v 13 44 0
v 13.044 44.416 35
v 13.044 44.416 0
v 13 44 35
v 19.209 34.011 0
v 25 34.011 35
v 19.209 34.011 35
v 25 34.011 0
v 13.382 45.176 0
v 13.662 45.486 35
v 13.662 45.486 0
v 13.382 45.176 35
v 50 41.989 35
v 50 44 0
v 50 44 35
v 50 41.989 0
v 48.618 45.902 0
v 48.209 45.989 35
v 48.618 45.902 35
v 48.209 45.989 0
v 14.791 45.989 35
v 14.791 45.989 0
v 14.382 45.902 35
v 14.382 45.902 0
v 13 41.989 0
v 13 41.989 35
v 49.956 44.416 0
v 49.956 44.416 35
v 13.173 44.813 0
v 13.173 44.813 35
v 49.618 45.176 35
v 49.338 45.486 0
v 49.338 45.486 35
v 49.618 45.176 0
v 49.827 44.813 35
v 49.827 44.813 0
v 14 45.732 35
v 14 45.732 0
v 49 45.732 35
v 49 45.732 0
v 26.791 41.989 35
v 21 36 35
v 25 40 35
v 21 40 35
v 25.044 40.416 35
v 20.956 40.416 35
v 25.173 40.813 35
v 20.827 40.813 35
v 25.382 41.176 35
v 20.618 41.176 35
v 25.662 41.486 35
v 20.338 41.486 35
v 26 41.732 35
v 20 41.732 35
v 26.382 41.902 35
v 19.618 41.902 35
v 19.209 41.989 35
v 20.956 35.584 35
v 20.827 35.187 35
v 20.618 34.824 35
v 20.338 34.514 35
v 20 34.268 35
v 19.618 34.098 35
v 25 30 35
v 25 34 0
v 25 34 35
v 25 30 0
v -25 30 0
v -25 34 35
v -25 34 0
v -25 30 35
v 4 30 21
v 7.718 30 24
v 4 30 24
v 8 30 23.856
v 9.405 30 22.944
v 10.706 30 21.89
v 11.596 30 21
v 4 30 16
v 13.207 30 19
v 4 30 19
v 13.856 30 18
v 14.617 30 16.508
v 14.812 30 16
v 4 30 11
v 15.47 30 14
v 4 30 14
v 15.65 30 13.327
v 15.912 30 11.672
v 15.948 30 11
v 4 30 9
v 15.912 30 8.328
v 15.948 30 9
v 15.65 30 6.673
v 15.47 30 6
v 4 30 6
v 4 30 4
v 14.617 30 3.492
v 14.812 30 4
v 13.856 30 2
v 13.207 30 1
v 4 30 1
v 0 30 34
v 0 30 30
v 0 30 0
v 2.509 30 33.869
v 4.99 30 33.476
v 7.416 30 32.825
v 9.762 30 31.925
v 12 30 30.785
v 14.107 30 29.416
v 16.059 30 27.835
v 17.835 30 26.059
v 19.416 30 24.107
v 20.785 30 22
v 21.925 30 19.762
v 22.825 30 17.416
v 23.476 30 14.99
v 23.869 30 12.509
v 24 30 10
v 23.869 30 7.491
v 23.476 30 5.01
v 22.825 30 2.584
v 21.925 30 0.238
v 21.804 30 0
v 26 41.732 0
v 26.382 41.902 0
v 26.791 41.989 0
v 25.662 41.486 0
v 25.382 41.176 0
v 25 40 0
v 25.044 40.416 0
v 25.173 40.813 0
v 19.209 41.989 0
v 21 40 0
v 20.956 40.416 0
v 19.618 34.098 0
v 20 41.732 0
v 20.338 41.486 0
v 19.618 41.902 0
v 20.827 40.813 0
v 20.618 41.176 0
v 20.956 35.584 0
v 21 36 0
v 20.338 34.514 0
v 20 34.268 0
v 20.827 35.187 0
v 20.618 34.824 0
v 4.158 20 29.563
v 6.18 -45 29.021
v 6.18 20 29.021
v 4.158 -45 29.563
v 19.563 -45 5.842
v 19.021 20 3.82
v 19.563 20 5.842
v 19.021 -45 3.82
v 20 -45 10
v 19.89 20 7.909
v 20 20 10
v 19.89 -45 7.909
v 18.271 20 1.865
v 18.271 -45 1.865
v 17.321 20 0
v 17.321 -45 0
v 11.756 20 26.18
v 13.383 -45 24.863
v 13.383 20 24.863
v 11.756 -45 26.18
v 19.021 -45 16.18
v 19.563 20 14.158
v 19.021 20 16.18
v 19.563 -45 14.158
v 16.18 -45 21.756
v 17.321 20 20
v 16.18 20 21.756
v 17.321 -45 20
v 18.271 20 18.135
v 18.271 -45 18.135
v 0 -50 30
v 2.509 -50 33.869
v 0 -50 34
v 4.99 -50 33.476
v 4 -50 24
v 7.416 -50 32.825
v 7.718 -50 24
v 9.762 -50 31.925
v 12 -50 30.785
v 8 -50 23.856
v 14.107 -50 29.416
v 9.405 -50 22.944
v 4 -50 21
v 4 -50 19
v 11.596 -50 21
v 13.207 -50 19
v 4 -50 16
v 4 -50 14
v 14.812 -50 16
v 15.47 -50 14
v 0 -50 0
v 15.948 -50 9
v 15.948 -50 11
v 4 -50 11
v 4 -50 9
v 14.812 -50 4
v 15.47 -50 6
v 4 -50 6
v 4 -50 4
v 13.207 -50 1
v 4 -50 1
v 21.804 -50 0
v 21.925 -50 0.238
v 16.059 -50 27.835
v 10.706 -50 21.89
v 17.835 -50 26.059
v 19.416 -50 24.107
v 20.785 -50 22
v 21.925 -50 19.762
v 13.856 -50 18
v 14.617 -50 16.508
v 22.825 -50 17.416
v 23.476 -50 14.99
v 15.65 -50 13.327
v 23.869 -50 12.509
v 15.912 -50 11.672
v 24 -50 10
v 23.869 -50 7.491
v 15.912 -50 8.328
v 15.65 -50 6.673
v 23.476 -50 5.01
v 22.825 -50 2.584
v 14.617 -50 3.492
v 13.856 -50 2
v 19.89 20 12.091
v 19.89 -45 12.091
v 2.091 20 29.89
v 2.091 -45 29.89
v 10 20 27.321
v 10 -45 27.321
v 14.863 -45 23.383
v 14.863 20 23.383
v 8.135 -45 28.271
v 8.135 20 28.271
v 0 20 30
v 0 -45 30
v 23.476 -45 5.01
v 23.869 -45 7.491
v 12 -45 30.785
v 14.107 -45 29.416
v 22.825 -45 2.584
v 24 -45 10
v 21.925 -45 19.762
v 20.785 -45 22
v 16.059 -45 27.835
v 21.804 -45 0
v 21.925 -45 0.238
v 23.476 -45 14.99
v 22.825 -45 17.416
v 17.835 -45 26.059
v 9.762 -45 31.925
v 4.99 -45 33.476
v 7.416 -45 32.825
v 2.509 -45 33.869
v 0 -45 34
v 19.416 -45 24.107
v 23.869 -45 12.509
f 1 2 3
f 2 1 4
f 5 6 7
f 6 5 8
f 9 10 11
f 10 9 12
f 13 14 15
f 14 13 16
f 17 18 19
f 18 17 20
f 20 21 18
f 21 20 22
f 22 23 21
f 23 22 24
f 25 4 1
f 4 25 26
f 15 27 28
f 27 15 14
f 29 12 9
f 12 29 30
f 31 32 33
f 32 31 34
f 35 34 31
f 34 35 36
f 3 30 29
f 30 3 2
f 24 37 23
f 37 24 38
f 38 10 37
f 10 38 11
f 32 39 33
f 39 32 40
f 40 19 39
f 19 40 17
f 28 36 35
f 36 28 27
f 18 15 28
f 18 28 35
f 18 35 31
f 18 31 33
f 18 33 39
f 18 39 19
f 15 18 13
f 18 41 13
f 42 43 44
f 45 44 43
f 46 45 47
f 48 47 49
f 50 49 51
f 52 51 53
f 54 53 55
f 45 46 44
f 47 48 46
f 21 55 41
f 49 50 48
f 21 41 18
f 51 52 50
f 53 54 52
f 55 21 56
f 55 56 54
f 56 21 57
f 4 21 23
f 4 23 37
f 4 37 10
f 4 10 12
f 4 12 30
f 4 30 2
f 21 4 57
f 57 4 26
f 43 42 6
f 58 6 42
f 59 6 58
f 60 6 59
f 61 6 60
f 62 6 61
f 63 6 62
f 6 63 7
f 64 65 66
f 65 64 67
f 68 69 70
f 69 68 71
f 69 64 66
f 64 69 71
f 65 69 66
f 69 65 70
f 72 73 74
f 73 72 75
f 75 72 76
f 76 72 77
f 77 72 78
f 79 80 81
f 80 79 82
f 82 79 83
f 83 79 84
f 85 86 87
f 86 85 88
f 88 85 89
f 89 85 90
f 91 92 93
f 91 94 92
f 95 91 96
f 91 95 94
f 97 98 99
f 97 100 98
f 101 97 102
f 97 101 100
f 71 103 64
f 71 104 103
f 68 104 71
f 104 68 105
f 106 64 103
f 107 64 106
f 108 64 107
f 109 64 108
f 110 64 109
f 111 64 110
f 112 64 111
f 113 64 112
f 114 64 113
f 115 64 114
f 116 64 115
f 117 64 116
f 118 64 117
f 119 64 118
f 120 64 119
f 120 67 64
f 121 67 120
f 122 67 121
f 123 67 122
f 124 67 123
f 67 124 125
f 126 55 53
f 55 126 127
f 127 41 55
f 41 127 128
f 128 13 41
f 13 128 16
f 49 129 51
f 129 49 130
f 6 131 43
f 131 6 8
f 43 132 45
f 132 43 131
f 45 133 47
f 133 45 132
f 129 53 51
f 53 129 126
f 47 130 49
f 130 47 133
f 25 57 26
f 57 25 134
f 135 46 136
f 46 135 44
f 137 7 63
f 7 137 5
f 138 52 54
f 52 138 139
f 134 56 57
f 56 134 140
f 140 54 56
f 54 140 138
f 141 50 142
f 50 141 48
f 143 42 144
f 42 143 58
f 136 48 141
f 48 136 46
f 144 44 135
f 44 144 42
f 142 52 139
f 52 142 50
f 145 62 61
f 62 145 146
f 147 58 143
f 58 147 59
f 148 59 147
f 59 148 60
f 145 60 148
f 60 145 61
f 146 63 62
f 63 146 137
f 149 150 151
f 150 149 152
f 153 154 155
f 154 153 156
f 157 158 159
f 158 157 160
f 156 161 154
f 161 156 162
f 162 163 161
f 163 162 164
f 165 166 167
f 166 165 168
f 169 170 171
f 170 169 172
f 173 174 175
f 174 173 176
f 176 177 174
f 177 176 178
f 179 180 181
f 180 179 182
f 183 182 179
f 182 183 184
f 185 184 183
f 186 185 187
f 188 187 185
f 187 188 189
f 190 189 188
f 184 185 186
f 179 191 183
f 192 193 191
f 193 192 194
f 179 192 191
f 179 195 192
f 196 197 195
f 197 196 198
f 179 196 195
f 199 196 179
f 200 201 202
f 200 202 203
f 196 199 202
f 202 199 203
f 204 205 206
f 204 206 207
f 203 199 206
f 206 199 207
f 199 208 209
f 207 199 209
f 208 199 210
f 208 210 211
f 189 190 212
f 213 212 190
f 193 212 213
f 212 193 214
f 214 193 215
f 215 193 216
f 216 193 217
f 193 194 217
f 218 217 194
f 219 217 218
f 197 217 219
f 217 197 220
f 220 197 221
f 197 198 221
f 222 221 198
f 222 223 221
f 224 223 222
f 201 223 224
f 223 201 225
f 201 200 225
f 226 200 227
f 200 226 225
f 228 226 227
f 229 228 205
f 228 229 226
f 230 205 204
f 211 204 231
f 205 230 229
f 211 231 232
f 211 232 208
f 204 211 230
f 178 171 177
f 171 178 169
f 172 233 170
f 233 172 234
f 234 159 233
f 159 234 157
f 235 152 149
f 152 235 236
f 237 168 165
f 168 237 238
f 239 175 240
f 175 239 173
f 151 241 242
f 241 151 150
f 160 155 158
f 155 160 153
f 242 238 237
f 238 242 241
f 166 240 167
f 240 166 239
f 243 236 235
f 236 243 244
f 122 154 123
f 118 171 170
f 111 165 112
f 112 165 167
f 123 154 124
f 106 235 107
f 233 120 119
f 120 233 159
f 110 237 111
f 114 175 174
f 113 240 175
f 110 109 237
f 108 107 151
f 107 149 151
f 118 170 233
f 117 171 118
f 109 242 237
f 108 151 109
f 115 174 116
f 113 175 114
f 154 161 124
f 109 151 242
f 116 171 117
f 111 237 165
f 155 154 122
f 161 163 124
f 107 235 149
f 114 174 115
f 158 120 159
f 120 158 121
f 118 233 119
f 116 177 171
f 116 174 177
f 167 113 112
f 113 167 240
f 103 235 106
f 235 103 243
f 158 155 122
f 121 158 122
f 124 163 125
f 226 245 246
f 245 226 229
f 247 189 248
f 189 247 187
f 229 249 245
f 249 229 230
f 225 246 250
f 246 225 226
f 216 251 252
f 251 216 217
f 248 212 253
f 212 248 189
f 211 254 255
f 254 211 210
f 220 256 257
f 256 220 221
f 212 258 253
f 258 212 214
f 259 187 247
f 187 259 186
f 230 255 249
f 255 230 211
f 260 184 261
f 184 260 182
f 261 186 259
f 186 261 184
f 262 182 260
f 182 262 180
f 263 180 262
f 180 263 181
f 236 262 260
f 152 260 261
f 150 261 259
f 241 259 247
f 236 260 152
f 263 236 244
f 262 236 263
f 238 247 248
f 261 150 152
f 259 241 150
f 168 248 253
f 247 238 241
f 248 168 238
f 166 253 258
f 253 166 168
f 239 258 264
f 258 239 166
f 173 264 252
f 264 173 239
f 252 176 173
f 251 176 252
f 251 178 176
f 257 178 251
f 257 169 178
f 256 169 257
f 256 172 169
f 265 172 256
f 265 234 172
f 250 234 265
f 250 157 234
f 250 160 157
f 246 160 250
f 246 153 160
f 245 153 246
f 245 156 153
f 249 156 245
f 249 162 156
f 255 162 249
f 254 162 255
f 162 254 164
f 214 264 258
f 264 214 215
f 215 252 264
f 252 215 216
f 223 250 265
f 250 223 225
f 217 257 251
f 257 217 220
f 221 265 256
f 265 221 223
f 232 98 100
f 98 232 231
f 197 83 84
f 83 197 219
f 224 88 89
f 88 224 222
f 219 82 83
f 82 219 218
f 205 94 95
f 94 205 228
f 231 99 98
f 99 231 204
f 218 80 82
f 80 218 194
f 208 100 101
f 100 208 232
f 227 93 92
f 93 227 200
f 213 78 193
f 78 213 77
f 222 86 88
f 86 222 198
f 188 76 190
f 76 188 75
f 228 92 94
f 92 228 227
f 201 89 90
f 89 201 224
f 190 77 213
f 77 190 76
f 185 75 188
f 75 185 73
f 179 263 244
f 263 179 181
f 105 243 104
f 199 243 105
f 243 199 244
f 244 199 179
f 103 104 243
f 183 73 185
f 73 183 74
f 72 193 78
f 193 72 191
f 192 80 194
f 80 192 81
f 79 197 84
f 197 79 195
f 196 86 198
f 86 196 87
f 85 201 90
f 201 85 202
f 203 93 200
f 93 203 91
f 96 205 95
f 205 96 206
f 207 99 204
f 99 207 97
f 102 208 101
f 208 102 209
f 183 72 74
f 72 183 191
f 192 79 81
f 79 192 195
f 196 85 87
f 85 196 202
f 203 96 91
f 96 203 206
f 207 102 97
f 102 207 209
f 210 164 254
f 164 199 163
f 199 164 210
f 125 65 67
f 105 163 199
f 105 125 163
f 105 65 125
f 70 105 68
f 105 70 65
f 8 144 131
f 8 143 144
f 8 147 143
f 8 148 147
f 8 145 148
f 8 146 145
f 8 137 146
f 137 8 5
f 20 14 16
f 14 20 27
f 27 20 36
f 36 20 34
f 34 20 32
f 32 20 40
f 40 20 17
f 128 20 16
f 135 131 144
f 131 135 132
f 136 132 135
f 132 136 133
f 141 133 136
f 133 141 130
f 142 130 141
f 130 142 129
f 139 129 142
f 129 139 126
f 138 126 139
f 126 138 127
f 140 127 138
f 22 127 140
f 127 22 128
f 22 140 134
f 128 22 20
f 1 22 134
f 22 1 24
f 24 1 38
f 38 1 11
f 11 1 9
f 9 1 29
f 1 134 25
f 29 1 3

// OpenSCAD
//Length of hook to hang spool on.
tube_length = 80;
//Diameter of spool holder
tube_diameter = 40;
//Size of spool retaining lip. Don't go too big or your spool won't fit over it.
lip_size = 4;
//Cut short some for easy printing with no support
cut_support = 15; 
//Thickness of the wall in the back of your printer.  Use 8 for flashforge.
hanger_gap = 8;  
//Thickness of hanger structure.  
structure_thickness = 4;
//Overall width of hanger
hanger_width = 50;  
/* [Hidden] */
hanger_gap_height = 15;
fillet_radius = 2;
tube_radius = tube_diameter/2;

difference() {
//transform for printing bed
translate([0, 30,hanger_width/2 - cut_support ])
rotate([0,90,0])
union() {
	$fn=60;
	translate([-hanger_width/2,structure_thickness+hanger_gap,50/2-hanger_gap_height])
	difference() {
		union() {
			translate([0,-hanger_gap,3]) //cube([50,structure_thickness+hanger_gap,40-3]);
			h_rounded_cube([50,structure_thickness+hanger_gap,40-3],2);
			translate([0,-hanger_gap,-50+hanger_gap_height]) mirror([0,1,0])
				cube([50,structure_thickness,50]);
		}
		mirror([0,1,0]) translate([-1,0,15]) 
			h_rounded_cube([hanger_width+2,10,30],fillet_radius);
		mirror([0,1,0]) translate([-1,0,-10]) 
			h_rounded_cube([hanger_width+2,hanger_gap,15-structure_thickness+10],fillet_radius);
	}
	//tube
	difference() {
		union() {
			rotate([90,0,0]) cylinder(h=tube_length, r=tube_radius);
			rotate([90,0,0]) cylinder(h=10, r1=tube_radius+lip_size, r2=tube_radius);
			translate([0,-tube_length,0]) rotate([-90,0,0]) 
				cylinder(h=5, r=tube_radius+lip_size);
		}
		rotate([90,0,0]) cylinder(h=tube_length+1, r=tube_radius-structure_thickness);
		translate([-500,-500])mirror([0,0,1])cube([1000,1000,1000]);
	}
	//make ribs on the center for support in the direction of gravity.
	intersection() {
		rotate([90,0,0]) cylinder(h=tube_length, r=tube_radius);
		union() {
			for(i = [-40:5:40]) {
				rotate([90,0,0]) translate([-1+i,0,0]) cube([2,100,100]);
			} 
			translate([-hanger_width/2,-tube_length,0])
				cube([hanger_width,tube_length,structure_thickness]);
		}
	}
}
translate([-500,-500,-1000])
cube([1000, 1000, 1000]);
}


module h_rounded_cube(xyz,r,$fn=30) {
	x = xyz[2];
	y = xyz[1];
	z = xyz[0];
	translate([z,0])
	rotate([0,-90,0])
	translate([r,r])
	hull() {
		cylinder(h=z,r=r);
		translate([0,y-2*r])
		cylinder(h=z,r=r);
		translate([x-2*r,0])
		cylinder(h=z,r=r);
		translate([x-2*r,y-2*r])
		cylinder(h=z,r=r);
	}
}
